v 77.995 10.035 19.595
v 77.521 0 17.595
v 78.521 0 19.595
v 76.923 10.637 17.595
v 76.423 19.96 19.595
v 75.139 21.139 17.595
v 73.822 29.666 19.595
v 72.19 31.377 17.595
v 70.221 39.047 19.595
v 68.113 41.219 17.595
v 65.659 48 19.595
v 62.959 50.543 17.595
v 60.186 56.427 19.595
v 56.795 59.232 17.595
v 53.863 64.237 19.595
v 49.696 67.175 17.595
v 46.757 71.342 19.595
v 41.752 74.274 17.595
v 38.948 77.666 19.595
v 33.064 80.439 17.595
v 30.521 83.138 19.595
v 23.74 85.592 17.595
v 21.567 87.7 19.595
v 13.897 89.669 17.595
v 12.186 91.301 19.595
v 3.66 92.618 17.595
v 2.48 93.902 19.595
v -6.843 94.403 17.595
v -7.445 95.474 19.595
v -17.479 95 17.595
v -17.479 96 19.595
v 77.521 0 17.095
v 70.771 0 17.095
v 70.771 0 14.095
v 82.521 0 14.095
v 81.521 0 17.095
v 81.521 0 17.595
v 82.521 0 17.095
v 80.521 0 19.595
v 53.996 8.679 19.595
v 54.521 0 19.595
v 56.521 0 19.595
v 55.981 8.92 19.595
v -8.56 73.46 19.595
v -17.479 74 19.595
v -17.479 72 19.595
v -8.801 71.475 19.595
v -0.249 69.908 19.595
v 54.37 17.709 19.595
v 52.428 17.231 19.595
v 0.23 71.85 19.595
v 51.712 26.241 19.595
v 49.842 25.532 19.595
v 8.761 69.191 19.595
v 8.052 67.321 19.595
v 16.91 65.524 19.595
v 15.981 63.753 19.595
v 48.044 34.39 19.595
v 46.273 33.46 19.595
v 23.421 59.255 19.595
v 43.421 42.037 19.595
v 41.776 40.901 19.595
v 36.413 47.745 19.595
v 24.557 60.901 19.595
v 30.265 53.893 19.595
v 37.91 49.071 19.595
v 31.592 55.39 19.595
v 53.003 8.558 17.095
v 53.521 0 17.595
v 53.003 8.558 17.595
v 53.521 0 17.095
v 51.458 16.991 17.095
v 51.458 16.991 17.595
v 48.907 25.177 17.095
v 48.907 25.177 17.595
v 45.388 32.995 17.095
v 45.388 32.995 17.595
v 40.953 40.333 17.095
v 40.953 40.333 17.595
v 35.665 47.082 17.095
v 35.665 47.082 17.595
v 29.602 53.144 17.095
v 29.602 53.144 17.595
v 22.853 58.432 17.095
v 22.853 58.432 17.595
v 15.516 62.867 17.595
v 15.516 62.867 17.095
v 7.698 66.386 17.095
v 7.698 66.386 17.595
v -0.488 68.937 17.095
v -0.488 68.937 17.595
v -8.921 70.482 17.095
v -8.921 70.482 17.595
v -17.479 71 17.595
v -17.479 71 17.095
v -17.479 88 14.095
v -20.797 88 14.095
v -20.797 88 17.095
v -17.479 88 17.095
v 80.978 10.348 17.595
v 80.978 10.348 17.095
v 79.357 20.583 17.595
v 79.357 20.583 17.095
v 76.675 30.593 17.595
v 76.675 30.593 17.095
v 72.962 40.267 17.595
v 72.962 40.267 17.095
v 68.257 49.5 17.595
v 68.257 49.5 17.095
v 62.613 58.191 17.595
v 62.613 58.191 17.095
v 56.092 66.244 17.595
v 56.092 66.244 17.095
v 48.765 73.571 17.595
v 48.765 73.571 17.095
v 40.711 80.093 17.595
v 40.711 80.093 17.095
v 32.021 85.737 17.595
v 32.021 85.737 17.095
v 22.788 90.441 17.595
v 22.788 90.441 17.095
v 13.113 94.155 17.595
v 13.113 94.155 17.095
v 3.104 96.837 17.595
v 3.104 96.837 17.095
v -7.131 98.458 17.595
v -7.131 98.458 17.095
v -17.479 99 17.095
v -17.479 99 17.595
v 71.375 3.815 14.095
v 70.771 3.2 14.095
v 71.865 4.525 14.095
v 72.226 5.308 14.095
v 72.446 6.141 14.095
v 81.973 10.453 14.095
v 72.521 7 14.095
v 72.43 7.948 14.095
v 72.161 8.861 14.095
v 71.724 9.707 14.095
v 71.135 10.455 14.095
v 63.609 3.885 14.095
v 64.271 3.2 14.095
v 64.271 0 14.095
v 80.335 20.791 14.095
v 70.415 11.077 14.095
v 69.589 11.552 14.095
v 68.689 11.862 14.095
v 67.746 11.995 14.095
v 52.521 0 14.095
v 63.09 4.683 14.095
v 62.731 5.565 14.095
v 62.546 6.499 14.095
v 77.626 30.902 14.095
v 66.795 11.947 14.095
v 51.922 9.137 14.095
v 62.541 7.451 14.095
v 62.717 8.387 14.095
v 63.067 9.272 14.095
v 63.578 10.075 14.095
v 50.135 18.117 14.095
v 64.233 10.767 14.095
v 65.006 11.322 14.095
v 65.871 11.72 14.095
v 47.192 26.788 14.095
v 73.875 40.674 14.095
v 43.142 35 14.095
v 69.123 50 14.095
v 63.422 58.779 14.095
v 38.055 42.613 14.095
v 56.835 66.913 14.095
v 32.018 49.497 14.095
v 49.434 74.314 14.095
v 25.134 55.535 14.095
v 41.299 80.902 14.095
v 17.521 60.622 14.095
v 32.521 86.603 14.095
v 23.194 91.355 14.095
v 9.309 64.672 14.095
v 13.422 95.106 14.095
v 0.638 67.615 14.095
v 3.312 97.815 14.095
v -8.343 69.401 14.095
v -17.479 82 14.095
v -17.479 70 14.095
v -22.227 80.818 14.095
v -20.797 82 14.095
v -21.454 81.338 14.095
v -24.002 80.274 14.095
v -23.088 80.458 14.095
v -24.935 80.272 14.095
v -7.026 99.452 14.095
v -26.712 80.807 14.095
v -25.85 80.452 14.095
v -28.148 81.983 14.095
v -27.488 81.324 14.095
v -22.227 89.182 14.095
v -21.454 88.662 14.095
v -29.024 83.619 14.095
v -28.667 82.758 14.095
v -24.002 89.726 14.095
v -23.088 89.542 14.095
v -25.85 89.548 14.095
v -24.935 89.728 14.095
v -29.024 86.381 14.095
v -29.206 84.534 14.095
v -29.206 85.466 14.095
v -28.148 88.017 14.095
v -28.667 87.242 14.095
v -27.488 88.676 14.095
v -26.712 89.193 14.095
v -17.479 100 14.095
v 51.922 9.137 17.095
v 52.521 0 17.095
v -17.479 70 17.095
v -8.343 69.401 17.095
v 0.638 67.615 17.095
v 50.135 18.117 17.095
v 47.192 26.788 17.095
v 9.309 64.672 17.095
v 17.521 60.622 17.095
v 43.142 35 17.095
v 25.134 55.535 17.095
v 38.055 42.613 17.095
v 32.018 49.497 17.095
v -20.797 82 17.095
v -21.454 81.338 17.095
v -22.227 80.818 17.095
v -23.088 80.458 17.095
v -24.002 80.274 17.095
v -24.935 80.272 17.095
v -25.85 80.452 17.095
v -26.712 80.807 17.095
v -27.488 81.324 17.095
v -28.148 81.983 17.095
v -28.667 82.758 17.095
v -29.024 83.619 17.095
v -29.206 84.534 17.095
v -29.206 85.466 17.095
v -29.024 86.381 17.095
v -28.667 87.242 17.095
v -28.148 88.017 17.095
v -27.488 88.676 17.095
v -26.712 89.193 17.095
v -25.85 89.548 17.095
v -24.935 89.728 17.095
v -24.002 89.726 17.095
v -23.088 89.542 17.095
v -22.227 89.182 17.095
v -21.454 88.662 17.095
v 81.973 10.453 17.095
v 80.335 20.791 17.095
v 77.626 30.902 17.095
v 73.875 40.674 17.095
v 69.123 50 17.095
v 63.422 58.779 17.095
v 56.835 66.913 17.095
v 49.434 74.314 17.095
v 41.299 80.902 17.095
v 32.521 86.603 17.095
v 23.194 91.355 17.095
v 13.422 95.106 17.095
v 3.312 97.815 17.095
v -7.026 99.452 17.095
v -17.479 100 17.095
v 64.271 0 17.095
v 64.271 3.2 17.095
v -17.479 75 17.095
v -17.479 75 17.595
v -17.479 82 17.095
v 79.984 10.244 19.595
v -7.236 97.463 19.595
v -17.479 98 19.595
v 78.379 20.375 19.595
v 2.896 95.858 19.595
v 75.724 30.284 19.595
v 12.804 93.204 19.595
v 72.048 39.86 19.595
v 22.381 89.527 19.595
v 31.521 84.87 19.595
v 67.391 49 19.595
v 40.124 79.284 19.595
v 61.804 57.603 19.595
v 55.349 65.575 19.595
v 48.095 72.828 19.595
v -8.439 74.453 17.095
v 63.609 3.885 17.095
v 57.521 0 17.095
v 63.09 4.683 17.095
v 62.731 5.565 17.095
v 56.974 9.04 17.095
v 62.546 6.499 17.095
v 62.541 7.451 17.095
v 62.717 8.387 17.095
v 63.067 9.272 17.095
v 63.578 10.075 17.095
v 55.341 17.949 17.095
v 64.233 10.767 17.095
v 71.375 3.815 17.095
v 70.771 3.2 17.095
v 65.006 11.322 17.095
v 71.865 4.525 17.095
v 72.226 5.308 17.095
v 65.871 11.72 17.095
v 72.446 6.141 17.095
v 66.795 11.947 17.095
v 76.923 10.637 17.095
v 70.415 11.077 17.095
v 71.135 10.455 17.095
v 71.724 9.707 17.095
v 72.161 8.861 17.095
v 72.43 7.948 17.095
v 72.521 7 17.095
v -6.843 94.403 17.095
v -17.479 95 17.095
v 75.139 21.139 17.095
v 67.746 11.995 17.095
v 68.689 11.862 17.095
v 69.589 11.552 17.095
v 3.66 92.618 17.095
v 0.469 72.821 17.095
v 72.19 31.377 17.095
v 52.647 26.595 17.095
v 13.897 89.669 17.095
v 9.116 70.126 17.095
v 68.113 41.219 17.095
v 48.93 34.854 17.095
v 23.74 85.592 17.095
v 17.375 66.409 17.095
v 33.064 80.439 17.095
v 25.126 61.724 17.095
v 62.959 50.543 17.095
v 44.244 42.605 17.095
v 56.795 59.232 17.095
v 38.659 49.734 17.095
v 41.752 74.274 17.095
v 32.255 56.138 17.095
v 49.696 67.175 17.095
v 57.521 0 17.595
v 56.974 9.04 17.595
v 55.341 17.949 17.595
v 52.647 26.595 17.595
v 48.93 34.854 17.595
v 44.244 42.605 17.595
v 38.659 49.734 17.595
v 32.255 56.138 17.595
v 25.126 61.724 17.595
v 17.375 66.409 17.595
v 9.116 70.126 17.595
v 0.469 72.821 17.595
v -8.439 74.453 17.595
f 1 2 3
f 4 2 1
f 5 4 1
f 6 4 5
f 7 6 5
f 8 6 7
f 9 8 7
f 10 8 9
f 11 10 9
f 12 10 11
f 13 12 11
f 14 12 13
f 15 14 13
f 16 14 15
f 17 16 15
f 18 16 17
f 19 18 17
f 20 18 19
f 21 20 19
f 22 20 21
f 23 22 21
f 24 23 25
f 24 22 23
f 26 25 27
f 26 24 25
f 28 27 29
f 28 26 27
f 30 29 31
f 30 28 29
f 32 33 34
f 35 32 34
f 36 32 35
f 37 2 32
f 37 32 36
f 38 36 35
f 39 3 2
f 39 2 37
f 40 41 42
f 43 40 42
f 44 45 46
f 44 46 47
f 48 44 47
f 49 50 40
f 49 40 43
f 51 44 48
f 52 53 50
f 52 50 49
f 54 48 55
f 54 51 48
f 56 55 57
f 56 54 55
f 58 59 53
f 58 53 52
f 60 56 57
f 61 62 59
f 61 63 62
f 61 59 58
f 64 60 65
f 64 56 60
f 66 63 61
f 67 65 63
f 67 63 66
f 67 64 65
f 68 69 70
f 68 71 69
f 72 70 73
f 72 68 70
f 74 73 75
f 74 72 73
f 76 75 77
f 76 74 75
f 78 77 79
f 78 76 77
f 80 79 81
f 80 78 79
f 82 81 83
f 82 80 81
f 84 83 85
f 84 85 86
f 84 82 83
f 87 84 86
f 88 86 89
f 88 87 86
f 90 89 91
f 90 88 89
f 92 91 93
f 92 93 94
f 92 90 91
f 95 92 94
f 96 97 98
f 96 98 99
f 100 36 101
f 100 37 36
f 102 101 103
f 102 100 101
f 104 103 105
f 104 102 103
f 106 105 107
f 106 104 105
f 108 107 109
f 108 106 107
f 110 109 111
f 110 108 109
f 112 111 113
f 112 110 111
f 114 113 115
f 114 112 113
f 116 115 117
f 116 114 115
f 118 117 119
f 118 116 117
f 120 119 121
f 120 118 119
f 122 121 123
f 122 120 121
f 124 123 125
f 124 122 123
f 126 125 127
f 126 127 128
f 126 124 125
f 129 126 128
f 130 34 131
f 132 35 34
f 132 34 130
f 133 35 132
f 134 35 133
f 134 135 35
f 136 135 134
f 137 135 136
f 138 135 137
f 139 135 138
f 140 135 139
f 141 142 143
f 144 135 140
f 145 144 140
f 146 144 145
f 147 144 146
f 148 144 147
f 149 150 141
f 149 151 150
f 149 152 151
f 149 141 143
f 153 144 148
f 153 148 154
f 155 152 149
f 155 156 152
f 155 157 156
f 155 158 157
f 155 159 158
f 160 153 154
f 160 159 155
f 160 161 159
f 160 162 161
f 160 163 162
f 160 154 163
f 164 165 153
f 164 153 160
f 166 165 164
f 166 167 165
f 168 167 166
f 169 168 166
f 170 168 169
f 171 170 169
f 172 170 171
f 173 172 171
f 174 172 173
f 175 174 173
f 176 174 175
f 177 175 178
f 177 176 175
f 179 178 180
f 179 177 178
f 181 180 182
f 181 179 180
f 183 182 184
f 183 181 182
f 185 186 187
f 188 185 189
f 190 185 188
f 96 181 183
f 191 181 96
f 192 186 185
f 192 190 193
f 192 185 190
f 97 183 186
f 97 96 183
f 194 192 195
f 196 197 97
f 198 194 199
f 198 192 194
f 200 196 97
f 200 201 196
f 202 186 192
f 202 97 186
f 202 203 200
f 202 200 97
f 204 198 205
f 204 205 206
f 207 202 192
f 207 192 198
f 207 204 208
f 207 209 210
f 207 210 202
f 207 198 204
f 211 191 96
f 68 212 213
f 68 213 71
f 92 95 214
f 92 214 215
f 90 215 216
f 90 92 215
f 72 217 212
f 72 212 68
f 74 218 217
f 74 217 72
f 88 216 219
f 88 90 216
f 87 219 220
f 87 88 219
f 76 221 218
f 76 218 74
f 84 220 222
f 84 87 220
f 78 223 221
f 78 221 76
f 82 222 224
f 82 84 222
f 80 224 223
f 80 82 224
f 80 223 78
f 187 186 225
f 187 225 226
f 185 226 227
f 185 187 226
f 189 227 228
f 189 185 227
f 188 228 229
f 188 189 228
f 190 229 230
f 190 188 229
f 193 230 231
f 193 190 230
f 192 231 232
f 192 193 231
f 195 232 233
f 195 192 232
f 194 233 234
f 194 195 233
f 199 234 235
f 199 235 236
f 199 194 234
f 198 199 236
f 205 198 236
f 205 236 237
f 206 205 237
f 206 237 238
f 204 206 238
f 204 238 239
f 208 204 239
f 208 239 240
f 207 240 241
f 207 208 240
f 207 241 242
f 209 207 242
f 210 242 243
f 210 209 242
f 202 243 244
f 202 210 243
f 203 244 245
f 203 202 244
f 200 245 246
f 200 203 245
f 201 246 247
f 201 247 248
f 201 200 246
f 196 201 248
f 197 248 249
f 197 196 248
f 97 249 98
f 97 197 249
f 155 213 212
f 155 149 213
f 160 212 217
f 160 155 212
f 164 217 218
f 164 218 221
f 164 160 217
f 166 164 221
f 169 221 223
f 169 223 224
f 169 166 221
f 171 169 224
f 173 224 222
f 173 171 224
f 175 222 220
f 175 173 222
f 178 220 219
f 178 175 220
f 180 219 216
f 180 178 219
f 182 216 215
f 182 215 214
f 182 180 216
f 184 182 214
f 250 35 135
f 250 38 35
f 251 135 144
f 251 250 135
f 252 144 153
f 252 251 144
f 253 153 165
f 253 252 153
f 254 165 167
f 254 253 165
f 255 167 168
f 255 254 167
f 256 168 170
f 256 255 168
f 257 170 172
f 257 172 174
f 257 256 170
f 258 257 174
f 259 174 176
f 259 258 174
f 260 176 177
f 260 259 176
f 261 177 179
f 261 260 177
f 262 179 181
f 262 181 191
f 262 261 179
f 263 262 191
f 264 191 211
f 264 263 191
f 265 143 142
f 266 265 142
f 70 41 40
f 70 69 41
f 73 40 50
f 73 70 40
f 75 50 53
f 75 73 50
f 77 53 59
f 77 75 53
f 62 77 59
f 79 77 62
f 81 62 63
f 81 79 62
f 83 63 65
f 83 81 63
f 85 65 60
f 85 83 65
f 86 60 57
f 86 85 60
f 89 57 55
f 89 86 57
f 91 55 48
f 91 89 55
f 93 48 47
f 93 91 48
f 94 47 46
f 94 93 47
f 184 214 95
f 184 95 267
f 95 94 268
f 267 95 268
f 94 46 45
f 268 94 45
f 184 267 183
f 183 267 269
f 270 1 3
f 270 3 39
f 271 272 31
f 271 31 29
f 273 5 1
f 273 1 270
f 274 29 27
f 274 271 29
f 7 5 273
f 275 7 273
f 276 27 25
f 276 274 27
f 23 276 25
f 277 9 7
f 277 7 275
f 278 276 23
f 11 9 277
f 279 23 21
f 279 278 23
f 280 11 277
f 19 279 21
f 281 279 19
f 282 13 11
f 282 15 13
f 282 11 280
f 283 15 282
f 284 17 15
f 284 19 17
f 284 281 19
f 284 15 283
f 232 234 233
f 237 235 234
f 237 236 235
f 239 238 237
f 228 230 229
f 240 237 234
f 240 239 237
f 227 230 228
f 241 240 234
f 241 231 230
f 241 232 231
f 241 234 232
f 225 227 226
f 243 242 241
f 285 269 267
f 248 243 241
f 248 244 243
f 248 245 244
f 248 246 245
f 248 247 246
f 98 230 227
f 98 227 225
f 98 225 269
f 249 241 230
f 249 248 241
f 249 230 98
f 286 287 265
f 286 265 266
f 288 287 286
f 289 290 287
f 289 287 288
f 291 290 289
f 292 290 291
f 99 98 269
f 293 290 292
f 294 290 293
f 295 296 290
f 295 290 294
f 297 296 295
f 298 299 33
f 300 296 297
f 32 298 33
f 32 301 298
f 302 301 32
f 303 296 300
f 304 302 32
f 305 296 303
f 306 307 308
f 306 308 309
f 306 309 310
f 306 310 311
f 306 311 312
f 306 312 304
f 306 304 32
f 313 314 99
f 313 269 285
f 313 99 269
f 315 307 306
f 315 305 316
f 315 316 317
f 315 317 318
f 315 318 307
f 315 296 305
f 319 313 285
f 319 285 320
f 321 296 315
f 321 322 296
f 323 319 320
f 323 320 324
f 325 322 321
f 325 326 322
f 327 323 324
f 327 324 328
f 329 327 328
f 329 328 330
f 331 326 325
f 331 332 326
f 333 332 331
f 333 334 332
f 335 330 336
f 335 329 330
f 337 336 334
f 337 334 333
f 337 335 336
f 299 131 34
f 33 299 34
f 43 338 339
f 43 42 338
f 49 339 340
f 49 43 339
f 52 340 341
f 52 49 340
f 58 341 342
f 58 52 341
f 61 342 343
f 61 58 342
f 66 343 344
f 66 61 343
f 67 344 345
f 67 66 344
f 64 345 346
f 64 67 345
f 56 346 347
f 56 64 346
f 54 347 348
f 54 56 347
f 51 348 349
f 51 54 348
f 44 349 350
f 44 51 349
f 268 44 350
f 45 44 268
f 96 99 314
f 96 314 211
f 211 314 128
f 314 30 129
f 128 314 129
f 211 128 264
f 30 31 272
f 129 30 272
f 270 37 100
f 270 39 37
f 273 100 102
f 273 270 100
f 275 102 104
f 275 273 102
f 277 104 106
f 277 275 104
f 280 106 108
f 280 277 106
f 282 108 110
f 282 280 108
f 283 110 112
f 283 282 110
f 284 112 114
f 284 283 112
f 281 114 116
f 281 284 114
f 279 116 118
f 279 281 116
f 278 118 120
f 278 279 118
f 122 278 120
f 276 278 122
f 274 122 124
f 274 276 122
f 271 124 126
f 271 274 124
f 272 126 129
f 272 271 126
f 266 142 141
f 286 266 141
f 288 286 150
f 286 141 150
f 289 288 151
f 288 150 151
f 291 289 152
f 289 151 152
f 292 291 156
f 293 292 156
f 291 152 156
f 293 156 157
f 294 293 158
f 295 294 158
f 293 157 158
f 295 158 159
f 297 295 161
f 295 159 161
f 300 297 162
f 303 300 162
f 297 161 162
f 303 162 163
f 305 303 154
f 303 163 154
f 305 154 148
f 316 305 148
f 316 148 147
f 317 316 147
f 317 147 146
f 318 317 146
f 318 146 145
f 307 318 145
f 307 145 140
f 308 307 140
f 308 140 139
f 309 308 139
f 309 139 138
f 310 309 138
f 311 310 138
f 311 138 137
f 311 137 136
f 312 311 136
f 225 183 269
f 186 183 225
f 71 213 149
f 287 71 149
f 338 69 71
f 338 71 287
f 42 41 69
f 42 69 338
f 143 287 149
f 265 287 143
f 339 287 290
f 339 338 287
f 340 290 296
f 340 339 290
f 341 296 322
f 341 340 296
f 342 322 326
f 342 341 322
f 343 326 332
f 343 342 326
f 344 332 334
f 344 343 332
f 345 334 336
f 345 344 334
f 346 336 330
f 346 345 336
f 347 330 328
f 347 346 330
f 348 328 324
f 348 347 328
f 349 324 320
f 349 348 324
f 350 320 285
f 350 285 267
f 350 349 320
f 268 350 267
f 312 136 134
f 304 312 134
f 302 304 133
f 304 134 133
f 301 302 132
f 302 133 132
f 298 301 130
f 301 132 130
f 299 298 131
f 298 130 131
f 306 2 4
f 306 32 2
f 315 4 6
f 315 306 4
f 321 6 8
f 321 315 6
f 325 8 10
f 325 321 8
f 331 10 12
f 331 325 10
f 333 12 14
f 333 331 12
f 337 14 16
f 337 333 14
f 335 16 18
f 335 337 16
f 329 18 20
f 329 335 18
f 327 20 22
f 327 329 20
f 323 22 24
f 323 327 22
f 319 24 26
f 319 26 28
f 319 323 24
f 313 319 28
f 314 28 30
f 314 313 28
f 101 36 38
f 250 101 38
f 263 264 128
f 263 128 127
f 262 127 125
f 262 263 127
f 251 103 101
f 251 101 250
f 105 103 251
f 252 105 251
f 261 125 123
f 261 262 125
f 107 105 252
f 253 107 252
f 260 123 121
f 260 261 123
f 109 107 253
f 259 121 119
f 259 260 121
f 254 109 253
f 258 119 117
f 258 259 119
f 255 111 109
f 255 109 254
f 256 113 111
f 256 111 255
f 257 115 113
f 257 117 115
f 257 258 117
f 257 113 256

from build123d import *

# Parameters (mm, degrees)
F1_ANGLE = 90
F3_DEPTH = 25
F5_DEPTH = 3


with BuildPart() as f1:
    # F0 (on Front) → F1 (revolve)
    with BuildSketch(Plane.XZ):
        Polygon((52.5206645727, 17.0954047681), (52.5206645727, 14.0954047681), (82.5206645727, 14.0954047681), (82.5206645727, 17.0954047681), (81.5206645727, 17.0954047681), (77.5206645727, 17.0954047681), (57.5206645727, 17.0954047681), (53.5206645727, 17.0954047681), align=None)
        Polygon((77.5206645727, 17.0954047681), (81.5206645727, 17.0954047681), (81.5206645727, 17.5954047681), (80.5206645727, 19.5954047681), (78.5206645727, 19.5954047681), (77.5206645727, 17.5954047681), align=None)
        Polygon((53.5206645727, 17.5954047681), (53.5206645727, 17.0954047681), (57.5206645727, 17.0954047681), (57.5206645727, 17.5954047681), (56.5206645727, 19.5954047681), (54.5206645727, 19.5954047681), align=None)
    revolve(axis=Axis((-17.4793354273, 0, 16.5954047681), (0, 0, 1)), revolution_arc=F1_ANGLE)

    # F2 (on face) → F3 (cut)
    with BuildSketch(Plane(origin=(0, 0, 14.0954047681), x_dir=(1, 0, 0), z_dir=(0, 0, -1))):
        with BuildLine():
            ThreePointArc((70.7706645727, -3.2003289616), (69.2529527716, -2.3096719096), (67.5206645727, -2))
            ThreePointArc((67.5206645727, -2), (65.7883763738, -2.3096719096), (64.2706645727, -3.2003289616))
            ThreePointArc((64.2706645727, -3.2003289616), (65.4290145064, -11.5414755311), (72.5206645727, -7))
            ThreePointArc((72.5206645727, -7), (72.0621401039, -4.9083499337), (70.7706645727, -3.2003289616))
        make_face()
        with BuildLine():
            Line((67.5206645727, -2), (67.5206645727, 0))
            Line((67.5206645727, 0), (64.2706645727, 0))
            Line((64.2706645727, 0), (64.2706645727, -3.2003289616))
            ThreePointArc((64.2706645727, -3.2003289616), (65.7883763738, -2.3096719096), (67.5206645727, -2))
        make_face()
        with BuildLine():
            Line((70.7706645727, 0), (67.5206645727, 0))
            Line((67.5206645727, 0), (67.5206645727, -2))
            ThreePointArc((67.5206645727, -2), (69.2529527716, -2.3096719096), (70.7706645727, -3.2003289616))
            Line((70.7706645727, -3.2003289616), (70.7706645727, 0))
        make_face()
    extrude(amount=-F3_DEPTH, mode=Mode.SUBTRACT)

    # F4 (on face) → F5 (join)
    with BuildSketch(Plane(origin=(0, 0, 14.0954047681), x_dir=(1, 0, 0), z_dir=(0, 0, -1))):
        with BuildLine():
            Line((-17.4793354273, -88), (-17.4793354273, -85))
            Line((-17.4793354273, -85), (-19.7293354273, -85))
            ThreePointArc((-19.7293354273, -85), (-20.0040998281, -86.5920949505), (-20.7966054616, -88))
            Line((-20.7966054616, -88), (-17.4793354273, -88))
        make_face()
        with BuildLine():
            Line((-19.7293354273, -85), (-17.4793354273, -85))
            Line((-17.4793354273, -85), (-17.4793354273, -82))
            Line((-17.4793354273, -82), (-20.7966054616, -82))
            ThreePointArc((-20.7966054616, -82), (-20.0040998281, -83.4079050495), (-19.7293354273, -85))
        make_face()
        with BuildLine():
            ThreePointArc((-20.7966054616, -88), (-20.0040998281, -86.5920949505), (-19.7293354273, -85))
            ThreePointArc((-19.7293354273, -85), (-20.0040998281, -83.4079050495), (-20.7966054616, -82))
            ThreePointArc((-20.7966054616, -82), (-29.2293354273, -85), (-20.7966054616, -88))
        make_face()
    extrude(amount=-F5_DEPTH)


solid = f1.part
